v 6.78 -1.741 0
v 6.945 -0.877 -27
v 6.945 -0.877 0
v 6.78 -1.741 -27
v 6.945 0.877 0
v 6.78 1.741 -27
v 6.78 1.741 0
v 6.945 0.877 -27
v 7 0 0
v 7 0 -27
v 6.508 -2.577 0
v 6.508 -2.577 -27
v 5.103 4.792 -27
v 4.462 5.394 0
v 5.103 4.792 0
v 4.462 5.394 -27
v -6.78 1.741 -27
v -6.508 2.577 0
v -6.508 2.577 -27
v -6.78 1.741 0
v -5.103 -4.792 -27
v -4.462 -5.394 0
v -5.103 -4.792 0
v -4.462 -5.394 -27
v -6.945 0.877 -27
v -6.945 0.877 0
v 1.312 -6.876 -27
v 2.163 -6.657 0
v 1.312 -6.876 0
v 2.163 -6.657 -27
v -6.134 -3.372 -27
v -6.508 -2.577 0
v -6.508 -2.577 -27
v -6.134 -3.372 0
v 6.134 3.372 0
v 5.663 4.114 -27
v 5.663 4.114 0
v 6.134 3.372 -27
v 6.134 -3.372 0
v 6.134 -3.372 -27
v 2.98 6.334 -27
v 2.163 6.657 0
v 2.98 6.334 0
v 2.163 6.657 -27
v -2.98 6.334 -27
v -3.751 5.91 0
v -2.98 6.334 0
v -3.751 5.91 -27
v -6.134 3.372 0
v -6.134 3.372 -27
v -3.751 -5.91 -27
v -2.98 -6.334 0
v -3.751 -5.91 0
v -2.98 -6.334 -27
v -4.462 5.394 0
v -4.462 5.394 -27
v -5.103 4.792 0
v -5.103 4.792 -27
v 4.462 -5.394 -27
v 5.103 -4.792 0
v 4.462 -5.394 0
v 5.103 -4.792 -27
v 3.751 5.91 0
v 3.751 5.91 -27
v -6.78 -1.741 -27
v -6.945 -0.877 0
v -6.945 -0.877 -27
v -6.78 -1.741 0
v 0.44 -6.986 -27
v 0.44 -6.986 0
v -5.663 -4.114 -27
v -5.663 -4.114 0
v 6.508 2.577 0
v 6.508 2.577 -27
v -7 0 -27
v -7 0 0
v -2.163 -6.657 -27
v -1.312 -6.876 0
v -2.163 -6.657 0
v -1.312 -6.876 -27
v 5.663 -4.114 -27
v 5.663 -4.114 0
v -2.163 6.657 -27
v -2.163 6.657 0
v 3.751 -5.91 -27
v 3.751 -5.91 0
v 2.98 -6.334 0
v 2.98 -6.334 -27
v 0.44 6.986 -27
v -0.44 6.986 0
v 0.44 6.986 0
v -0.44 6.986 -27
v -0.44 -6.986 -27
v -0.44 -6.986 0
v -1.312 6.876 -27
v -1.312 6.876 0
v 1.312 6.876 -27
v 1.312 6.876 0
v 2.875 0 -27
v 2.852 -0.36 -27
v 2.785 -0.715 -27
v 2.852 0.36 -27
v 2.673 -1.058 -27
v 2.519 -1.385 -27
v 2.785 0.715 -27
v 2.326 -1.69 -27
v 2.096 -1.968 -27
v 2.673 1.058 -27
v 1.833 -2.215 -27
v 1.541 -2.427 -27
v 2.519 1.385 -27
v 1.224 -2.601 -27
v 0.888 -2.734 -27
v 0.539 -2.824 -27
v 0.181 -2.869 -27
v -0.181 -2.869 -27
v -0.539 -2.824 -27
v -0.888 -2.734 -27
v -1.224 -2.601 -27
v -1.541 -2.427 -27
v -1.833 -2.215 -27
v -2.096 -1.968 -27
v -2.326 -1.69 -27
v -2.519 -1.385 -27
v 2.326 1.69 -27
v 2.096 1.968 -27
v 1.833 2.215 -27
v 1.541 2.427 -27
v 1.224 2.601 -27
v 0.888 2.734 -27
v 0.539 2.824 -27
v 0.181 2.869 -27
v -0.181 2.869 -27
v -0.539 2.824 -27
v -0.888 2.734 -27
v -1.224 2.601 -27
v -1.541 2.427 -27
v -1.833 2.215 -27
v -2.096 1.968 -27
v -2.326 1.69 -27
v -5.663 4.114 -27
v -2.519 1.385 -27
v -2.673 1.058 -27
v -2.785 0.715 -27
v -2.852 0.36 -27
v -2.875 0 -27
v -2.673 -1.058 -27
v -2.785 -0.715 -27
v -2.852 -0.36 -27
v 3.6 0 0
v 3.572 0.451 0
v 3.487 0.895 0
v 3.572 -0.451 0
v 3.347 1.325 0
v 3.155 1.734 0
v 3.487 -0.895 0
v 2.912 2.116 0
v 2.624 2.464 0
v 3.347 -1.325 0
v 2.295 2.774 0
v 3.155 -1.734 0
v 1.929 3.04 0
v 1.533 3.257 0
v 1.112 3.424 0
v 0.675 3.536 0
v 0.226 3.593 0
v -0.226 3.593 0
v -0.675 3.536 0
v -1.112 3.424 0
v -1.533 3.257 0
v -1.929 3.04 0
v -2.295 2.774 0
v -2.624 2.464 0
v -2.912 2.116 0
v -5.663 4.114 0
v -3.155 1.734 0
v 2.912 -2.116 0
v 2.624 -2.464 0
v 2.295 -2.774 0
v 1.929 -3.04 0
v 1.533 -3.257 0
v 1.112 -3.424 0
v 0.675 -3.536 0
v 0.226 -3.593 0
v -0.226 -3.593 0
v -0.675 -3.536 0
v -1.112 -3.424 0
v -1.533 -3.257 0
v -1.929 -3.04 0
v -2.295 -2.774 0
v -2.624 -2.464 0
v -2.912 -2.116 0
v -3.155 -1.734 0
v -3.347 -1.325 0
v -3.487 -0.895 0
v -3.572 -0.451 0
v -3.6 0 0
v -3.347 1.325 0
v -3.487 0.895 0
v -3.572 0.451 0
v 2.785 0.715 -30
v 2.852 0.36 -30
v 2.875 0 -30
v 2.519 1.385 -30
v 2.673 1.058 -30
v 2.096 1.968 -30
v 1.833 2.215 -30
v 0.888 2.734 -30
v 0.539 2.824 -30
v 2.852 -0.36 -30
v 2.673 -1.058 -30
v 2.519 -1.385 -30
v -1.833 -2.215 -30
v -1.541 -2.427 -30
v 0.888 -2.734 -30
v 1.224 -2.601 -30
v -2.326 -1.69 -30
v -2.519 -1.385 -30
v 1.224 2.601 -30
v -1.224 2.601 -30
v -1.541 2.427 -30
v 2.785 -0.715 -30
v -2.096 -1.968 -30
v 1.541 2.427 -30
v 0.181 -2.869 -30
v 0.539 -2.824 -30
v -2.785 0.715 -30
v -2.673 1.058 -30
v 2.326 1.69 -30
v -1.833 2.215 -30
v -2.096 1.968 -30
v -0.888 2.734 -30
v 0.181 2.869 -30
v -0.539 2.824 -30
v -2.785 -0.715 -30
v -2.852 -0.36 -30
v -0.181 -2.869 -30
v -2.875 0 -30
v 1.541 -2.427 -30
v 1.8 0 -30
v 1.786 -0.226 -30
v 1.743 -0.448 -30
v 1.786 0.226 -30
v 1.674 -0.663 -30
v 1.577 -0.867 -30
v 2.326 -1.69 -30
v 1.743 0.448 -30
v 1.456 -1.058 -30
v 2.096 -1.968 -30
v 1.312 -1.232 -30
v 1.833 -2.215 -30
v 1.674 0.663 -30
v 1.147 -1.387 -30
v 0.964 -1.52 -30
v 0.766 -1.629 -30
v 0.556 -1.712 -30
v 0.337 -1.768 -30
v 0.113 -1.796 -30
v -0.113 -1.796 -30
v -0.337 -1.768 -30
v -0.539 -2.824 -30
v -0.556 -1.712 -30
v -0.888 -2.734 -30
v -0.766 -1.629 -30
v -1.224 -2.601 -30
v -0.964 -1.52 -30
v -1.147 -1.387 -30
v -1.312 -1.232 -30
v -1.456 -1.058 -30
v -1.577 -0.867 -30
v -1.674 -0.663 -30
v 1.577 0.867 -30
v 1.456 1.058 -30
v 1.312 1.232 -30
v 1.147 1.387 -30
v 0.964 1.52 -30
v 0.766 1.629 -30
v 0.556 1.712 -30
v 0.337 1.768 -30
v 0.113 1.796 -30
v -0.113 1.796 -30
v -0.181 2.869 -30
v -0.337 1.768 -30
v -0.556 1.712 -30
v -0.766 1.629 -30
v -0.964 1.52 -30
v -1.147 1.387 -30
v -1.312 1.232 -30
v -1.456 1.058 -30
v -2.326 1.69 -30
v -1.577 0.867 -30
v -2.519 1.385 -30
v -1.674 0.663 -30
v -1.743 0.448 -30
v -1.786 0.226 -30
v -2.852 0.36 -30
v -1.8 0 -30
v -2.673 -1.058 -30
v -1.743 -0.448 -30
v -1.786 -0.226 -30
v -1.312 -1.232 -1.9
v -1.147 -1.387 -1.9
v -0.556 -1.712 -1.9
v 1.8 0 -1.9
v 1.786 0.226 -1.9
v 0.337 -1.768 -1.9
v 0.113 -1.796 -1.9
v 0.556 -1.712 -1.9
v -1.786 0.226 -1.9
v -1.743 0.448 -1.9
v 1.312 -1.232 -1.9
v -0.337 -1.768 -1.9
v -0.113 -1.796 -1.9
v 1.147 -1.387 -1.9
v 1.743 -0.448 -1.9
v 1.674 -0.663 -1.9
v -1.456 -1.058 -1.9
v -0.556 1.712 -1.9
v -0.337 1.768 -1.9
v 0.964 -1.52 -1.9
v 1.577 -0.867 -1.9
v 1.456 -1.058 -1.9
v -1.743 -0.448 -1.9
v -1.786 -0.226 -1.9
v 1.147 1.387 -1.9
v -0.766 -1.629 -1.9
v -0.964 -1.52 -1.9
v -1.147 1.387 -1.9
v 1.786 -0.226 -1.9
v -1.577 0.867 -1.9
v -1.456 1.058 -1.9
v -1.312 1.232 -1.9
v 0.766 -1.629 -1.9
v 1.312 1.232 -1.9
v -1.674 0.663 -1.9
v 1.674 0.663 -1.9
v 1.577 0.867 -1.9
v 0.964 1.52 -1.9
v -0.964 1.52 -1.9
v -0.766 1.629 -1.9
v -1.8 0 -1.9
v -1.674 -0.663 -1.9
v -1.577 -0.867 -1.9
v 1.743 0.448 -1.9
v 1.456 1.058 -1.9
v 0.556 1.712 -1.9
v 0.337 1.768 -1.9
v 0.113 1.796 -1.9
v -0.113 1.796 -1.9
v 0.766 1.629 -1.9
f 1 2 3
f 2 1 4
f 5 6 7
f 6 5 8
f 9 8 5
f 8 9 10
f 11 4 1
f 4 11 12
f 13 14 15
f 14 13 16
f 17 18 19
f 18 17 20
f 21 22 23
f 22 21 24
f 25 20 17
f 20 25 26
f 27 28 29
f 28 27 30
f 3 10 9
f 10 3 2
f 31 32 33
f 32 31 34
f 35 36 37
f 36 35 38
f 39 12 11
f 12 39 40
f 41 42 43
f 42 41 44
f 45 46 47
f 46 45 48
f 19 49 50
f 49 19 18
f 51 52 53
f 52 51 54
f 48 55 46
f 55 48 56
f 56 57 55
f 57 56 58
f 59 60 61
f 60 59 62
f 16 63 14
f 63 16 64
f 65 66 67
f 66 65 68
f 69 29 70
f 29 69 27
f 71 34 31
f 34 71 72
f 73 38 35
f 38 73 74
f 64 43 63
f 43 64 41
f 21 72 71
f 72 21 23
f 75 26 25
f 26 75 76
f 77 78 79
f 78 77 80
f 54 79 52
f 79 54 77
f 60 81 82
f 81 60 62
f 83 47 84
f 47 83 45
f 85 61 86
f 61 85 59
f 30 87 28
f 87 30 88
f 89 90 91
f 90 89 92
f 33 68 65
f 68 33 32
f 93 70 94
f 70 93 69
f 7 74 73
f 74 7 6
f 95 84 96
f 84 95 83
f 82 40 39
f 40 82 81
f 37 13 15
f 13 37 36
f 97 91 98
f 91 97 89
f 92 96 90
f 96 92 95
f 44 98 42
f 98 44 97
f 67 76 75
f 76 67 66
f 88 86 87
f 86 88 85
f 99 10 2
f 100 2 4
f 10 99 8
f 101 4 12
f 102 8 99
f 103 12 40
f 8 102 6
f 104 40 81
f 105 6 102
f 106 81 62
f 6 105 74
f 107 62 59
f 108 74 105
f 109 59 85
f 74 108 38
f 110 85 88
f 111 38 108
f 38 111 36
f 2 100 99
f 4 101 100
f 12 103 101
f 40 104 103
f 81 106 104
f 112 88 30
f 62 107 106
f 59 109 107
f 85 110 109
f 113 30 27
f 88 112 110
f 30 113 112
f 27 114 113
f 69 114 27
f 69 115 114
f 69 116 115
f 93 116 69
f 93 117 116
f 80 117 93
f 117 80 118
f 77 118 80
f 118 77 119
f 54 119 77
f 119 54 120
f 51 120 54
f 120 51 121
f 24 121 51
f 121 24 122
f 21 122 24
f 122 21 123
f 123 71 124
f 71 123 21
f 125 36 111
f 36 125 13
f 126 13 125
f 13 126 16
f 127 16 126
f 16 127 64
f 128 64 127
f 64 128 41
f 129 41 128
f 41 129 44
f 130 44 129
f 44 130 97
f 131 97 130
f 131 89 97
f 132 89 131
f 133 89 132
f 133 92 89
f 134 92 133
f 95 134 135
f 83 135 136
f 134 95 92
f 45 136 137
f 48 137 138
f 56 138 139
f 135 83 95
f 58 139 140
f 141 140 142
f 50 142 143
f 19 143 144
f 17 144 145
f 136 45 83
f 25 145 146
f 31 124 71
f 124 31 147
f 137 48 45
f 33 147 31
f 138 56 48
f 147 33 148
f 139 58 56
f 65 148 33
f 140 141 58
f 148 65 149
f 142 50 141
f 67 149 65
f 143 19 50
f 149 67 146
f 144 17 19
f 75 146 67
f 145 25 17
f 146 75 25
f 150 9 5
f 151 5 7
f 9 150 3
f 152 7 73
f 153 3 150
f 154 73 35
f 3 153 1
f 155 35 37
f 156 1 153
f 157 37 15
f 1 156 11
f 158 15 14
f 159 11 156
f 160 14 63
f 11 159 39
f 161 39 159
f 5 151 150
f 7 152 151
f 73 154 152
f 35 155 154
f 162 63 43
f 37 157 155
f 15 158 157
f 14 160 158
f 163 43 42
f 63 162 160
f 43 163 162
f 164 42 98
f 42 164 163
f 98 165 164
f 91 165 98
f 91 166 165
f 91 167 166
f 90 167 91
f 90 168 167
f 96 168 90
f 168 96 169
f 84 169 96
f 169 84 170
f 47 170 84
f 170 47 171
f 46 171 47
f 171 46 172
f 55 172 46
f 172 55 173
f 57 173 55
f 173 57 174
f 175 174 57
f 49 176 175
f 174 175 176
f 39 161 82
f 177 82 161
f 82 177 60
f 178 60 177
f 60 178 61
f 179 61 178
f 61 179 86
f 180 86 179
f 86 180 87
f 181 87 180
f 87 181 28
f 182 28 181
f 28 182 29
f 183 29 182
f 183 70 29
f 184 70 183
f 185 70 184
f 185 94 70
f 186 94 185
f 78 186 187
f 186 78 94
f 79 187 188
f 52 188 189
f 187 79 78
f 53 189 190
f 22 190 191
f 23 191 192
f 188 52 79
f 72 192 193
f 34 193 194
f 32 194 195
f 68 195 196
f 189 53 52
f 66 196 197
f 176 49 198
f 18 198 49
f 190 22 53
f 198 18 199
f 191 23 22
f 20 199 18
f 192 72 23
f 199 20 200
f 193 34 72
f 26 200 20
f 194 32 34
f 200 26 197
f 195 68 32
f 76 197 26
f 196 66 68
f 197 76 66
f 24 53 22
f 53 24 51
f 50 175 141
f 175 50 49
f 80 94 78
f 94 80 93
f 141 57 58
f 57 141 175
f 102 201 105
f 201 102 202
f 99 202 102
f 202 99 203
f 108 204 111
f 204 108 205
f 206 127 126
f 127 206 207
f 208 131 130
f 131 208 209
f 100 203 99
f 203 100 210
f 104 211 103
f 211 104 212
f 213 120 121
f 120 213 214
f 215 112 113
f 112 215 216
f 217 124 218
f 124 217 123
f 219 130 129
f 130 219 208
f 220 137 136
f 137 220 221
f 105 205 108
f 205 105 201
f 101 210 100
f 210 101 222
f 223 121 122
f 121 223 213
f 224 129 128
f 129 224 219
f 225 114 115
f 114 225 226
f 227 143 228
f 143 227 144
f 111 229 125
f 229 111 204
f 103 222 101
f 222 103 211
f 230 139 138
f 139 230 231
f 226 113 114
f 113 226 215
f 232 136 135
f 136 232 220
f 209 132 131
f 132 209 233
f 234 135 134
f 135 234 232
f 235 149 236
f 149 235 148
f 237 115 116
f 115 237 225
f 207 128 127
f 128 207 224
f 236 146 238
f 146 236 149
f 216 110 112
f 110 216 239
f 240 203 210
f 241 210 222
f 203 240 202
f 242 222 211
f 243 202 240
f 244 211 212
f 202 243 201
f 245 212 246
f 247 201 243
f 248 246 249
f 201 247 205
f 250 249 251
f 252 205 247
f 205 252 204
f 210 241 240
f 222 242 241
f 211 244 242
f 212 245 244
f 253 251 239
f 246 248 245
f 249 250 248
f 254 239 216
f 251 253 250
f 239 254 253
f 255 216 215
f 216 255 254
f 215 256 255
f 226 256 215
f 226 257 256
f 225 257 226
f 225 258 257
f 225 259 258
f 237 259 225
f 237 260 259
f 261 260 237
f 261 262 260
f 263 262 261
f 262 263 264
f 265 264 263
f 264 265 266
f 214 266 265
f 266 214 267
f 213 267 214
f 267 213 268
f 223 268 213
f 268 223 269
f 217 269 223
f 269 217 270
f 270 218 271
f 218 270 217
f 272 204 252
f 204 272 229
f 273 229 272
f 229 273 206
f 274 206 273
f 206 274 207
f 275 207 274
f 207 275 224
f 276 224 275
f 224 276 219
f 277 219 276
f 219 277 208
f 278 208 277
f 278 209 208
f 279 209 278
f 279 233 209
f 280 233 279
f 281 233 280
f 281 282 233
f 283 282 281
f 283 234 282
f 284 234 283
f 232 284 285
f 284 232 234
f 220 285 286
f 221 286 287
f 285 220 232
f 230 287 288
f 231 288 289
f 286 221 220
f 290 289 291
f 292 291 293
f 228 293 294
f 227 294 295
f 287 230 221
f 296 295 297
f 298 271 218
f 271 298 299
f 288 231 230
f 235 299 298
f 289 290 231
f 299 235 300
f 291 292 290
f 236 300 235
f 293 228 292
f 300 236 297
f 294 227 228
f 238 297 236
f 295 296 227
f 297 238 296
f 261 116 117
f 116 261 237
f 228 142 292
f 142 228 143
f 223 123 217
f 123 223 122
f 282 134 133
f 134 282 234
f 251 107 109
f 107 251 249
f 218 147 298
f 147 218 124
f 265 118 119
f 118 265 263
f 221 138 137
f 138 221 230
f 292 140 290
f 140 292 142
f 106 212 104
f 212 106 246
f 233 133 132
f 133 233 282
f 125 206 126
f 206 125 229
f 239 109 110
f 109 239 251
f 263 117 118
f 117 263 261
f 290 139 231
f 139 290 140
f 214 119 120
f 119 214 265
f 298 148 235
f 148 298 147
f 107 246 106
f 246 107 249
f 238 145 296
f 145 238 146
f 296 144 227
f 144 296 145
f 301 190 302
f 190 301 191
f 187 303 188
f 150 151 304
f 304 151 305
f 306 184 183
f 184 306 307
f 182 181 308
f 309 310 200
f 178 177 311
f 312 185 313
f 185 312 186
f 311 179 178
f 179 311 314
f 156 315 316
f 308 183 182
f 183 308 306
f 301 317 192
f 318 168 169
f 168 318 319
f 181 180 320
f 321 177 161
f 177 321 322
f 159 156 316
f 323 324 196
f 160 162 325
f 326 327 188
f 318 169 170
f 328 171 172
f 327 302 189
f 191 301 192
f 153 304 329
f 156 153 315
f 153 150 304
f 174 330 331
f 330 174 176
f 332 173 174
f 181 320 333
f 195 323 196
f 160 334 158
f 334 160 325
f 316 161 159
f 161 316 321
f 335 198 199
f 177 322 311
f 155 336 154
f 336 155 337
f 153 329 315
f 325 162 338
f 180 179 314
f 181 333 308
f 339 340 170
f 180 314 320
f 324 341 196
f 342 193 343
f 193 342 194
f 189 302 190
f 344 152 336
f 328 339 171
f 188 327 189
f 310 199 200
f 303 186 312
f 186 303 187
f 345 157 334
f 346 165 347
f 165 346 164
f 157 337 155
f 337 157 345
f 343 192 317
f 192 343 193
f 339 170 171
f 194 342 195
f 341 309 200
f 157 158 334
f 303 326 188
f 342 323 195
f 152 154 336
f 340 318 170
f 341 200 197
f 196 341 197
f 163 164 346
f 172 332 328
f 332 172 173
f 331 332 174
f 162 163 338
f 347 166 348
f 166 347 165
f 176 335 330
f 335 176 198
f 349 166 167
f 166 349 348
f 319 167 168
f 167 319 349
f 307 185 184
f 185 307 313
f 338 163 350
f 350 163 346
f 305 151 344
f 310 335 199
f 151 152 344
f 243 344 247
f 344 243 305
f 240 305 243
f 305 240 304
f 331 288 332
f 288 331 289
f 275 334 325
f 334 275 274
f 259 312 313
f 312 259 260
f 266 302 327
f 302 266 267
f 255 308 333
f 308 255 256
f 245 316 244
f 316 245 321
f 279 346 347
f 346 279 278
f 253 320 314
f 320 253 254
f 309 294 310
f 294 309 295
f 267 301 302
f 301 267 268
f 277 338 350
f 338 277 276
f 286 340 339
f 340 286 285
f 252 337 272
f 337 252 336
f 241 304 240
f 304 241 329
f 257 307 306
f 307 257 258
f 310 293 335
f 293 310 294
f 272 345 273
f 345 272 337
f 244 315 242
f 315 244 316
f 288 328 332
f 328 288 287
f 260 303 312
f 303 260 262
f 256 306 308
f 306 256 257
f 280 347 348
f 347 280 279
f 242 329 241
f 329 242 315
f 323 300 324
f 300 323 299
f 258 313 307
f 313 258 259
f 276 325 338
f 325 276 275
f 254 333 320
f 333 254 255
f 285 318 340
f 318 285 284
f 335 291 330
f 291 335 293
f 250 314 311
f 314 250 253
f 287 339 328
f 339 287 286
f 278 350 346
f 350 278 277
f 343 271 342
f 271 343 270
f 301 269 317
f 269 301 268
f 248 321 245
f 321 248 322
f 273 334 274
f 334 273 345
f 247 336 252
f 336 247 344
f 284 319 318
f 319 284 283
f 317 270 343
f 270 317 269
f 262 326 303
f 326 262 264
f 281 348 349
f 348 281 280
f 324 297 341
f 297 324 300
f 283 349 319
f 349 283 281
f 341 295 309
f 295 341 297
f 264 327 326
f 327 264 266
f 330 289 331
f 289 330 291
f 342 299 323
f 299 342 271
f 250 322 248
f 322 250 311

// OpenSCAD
$fn = 50;


difference() {
	union() {
		translate(v = [0, 0, -27.0000000000]) {
			cylinder(h = 27, r = 7.0000000000);
		}
		#translate(v = [0, 0, -30.0000000000]) {
			cylinder(h = 30, r = 2.8750000000);
		}
	}
	union() {
		translate(v = [0, 0, 0]) {
			rotate(a = [0, 0, 0]) {
				difference() {
					union() {
						translate(v = [0, 0, -30.0000000000]) {
							cylinder(h = 30, r = 1.5000000000);
						}
						translate(v = [0, 0, -1.9000000000]) {
							cylinder(h = 1.9000000000, r1 = 1.8000000000, r2 = 3.6000000000);
						}
						translate(v = [0, 0, -30.0000000000]) {
							cylinder(h = 30, r = 1.8000000000);
						}
						translate(v = [0, 0, -30.0000000000]) {
							cylinder(h = 30, r = 1.5000000000);
						}
					}
					union();
				}
			}
		}
	}
}
